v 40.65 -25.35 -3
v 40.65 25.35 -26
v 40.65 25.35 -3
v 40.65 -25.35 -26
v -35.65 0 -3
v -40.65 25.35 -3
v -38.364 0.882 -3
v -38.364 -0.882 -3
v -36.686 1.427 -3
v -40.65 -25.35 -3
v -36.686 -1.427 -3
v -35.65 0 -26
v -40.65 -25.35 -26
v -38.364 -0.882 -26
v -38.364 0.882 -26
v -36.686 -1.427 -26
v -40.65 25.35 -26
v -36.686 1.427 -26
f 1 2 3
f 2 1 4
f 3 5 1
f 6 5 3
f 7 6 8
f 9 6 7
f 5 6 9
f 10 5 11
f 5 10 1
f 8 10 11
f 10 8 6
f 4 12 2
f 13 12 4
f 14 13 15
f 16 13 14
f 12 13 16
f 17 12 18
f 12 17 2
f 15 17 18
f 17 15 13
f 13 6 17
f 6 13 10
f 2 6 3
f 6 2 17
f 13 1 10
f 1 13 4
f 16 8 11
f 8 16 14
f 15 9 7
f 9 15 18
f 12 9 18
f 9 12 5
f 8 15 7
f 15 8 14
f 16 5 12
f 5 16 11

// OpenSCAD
// file: dimensions.scad
function plate_width() = 193.422;
function plate_height() = 117.392;
function plate_thickness() = 3;
function separation() = 5;
function led_width() = 10;
function led_height() = 2.5;
function hole_radius() = 1.5;
function hole_offset() = 3.5 + hole_radius();
function separator_thickness() = (led_width()-plate_thickness())/2;

function electronics_width() = 81.3;
function electronics_height() = 50.7;
function electronics_thickness() = 23;
// main file
use <dimensions.scad>

hole_inset = 3.5;
module electronics() {
    translate([0, 0, -electronics_thickness()/2-3])
    difference() {
        cube([electronics_width(), electronics_height(), electronics_thickness()], center=true);
        translate([-electronics_width()/2 + hole_inset, 0, 0])
        cylinder(h=electronics_thickness()*2, r=1.5, center=true);
    }
}

electronics();
